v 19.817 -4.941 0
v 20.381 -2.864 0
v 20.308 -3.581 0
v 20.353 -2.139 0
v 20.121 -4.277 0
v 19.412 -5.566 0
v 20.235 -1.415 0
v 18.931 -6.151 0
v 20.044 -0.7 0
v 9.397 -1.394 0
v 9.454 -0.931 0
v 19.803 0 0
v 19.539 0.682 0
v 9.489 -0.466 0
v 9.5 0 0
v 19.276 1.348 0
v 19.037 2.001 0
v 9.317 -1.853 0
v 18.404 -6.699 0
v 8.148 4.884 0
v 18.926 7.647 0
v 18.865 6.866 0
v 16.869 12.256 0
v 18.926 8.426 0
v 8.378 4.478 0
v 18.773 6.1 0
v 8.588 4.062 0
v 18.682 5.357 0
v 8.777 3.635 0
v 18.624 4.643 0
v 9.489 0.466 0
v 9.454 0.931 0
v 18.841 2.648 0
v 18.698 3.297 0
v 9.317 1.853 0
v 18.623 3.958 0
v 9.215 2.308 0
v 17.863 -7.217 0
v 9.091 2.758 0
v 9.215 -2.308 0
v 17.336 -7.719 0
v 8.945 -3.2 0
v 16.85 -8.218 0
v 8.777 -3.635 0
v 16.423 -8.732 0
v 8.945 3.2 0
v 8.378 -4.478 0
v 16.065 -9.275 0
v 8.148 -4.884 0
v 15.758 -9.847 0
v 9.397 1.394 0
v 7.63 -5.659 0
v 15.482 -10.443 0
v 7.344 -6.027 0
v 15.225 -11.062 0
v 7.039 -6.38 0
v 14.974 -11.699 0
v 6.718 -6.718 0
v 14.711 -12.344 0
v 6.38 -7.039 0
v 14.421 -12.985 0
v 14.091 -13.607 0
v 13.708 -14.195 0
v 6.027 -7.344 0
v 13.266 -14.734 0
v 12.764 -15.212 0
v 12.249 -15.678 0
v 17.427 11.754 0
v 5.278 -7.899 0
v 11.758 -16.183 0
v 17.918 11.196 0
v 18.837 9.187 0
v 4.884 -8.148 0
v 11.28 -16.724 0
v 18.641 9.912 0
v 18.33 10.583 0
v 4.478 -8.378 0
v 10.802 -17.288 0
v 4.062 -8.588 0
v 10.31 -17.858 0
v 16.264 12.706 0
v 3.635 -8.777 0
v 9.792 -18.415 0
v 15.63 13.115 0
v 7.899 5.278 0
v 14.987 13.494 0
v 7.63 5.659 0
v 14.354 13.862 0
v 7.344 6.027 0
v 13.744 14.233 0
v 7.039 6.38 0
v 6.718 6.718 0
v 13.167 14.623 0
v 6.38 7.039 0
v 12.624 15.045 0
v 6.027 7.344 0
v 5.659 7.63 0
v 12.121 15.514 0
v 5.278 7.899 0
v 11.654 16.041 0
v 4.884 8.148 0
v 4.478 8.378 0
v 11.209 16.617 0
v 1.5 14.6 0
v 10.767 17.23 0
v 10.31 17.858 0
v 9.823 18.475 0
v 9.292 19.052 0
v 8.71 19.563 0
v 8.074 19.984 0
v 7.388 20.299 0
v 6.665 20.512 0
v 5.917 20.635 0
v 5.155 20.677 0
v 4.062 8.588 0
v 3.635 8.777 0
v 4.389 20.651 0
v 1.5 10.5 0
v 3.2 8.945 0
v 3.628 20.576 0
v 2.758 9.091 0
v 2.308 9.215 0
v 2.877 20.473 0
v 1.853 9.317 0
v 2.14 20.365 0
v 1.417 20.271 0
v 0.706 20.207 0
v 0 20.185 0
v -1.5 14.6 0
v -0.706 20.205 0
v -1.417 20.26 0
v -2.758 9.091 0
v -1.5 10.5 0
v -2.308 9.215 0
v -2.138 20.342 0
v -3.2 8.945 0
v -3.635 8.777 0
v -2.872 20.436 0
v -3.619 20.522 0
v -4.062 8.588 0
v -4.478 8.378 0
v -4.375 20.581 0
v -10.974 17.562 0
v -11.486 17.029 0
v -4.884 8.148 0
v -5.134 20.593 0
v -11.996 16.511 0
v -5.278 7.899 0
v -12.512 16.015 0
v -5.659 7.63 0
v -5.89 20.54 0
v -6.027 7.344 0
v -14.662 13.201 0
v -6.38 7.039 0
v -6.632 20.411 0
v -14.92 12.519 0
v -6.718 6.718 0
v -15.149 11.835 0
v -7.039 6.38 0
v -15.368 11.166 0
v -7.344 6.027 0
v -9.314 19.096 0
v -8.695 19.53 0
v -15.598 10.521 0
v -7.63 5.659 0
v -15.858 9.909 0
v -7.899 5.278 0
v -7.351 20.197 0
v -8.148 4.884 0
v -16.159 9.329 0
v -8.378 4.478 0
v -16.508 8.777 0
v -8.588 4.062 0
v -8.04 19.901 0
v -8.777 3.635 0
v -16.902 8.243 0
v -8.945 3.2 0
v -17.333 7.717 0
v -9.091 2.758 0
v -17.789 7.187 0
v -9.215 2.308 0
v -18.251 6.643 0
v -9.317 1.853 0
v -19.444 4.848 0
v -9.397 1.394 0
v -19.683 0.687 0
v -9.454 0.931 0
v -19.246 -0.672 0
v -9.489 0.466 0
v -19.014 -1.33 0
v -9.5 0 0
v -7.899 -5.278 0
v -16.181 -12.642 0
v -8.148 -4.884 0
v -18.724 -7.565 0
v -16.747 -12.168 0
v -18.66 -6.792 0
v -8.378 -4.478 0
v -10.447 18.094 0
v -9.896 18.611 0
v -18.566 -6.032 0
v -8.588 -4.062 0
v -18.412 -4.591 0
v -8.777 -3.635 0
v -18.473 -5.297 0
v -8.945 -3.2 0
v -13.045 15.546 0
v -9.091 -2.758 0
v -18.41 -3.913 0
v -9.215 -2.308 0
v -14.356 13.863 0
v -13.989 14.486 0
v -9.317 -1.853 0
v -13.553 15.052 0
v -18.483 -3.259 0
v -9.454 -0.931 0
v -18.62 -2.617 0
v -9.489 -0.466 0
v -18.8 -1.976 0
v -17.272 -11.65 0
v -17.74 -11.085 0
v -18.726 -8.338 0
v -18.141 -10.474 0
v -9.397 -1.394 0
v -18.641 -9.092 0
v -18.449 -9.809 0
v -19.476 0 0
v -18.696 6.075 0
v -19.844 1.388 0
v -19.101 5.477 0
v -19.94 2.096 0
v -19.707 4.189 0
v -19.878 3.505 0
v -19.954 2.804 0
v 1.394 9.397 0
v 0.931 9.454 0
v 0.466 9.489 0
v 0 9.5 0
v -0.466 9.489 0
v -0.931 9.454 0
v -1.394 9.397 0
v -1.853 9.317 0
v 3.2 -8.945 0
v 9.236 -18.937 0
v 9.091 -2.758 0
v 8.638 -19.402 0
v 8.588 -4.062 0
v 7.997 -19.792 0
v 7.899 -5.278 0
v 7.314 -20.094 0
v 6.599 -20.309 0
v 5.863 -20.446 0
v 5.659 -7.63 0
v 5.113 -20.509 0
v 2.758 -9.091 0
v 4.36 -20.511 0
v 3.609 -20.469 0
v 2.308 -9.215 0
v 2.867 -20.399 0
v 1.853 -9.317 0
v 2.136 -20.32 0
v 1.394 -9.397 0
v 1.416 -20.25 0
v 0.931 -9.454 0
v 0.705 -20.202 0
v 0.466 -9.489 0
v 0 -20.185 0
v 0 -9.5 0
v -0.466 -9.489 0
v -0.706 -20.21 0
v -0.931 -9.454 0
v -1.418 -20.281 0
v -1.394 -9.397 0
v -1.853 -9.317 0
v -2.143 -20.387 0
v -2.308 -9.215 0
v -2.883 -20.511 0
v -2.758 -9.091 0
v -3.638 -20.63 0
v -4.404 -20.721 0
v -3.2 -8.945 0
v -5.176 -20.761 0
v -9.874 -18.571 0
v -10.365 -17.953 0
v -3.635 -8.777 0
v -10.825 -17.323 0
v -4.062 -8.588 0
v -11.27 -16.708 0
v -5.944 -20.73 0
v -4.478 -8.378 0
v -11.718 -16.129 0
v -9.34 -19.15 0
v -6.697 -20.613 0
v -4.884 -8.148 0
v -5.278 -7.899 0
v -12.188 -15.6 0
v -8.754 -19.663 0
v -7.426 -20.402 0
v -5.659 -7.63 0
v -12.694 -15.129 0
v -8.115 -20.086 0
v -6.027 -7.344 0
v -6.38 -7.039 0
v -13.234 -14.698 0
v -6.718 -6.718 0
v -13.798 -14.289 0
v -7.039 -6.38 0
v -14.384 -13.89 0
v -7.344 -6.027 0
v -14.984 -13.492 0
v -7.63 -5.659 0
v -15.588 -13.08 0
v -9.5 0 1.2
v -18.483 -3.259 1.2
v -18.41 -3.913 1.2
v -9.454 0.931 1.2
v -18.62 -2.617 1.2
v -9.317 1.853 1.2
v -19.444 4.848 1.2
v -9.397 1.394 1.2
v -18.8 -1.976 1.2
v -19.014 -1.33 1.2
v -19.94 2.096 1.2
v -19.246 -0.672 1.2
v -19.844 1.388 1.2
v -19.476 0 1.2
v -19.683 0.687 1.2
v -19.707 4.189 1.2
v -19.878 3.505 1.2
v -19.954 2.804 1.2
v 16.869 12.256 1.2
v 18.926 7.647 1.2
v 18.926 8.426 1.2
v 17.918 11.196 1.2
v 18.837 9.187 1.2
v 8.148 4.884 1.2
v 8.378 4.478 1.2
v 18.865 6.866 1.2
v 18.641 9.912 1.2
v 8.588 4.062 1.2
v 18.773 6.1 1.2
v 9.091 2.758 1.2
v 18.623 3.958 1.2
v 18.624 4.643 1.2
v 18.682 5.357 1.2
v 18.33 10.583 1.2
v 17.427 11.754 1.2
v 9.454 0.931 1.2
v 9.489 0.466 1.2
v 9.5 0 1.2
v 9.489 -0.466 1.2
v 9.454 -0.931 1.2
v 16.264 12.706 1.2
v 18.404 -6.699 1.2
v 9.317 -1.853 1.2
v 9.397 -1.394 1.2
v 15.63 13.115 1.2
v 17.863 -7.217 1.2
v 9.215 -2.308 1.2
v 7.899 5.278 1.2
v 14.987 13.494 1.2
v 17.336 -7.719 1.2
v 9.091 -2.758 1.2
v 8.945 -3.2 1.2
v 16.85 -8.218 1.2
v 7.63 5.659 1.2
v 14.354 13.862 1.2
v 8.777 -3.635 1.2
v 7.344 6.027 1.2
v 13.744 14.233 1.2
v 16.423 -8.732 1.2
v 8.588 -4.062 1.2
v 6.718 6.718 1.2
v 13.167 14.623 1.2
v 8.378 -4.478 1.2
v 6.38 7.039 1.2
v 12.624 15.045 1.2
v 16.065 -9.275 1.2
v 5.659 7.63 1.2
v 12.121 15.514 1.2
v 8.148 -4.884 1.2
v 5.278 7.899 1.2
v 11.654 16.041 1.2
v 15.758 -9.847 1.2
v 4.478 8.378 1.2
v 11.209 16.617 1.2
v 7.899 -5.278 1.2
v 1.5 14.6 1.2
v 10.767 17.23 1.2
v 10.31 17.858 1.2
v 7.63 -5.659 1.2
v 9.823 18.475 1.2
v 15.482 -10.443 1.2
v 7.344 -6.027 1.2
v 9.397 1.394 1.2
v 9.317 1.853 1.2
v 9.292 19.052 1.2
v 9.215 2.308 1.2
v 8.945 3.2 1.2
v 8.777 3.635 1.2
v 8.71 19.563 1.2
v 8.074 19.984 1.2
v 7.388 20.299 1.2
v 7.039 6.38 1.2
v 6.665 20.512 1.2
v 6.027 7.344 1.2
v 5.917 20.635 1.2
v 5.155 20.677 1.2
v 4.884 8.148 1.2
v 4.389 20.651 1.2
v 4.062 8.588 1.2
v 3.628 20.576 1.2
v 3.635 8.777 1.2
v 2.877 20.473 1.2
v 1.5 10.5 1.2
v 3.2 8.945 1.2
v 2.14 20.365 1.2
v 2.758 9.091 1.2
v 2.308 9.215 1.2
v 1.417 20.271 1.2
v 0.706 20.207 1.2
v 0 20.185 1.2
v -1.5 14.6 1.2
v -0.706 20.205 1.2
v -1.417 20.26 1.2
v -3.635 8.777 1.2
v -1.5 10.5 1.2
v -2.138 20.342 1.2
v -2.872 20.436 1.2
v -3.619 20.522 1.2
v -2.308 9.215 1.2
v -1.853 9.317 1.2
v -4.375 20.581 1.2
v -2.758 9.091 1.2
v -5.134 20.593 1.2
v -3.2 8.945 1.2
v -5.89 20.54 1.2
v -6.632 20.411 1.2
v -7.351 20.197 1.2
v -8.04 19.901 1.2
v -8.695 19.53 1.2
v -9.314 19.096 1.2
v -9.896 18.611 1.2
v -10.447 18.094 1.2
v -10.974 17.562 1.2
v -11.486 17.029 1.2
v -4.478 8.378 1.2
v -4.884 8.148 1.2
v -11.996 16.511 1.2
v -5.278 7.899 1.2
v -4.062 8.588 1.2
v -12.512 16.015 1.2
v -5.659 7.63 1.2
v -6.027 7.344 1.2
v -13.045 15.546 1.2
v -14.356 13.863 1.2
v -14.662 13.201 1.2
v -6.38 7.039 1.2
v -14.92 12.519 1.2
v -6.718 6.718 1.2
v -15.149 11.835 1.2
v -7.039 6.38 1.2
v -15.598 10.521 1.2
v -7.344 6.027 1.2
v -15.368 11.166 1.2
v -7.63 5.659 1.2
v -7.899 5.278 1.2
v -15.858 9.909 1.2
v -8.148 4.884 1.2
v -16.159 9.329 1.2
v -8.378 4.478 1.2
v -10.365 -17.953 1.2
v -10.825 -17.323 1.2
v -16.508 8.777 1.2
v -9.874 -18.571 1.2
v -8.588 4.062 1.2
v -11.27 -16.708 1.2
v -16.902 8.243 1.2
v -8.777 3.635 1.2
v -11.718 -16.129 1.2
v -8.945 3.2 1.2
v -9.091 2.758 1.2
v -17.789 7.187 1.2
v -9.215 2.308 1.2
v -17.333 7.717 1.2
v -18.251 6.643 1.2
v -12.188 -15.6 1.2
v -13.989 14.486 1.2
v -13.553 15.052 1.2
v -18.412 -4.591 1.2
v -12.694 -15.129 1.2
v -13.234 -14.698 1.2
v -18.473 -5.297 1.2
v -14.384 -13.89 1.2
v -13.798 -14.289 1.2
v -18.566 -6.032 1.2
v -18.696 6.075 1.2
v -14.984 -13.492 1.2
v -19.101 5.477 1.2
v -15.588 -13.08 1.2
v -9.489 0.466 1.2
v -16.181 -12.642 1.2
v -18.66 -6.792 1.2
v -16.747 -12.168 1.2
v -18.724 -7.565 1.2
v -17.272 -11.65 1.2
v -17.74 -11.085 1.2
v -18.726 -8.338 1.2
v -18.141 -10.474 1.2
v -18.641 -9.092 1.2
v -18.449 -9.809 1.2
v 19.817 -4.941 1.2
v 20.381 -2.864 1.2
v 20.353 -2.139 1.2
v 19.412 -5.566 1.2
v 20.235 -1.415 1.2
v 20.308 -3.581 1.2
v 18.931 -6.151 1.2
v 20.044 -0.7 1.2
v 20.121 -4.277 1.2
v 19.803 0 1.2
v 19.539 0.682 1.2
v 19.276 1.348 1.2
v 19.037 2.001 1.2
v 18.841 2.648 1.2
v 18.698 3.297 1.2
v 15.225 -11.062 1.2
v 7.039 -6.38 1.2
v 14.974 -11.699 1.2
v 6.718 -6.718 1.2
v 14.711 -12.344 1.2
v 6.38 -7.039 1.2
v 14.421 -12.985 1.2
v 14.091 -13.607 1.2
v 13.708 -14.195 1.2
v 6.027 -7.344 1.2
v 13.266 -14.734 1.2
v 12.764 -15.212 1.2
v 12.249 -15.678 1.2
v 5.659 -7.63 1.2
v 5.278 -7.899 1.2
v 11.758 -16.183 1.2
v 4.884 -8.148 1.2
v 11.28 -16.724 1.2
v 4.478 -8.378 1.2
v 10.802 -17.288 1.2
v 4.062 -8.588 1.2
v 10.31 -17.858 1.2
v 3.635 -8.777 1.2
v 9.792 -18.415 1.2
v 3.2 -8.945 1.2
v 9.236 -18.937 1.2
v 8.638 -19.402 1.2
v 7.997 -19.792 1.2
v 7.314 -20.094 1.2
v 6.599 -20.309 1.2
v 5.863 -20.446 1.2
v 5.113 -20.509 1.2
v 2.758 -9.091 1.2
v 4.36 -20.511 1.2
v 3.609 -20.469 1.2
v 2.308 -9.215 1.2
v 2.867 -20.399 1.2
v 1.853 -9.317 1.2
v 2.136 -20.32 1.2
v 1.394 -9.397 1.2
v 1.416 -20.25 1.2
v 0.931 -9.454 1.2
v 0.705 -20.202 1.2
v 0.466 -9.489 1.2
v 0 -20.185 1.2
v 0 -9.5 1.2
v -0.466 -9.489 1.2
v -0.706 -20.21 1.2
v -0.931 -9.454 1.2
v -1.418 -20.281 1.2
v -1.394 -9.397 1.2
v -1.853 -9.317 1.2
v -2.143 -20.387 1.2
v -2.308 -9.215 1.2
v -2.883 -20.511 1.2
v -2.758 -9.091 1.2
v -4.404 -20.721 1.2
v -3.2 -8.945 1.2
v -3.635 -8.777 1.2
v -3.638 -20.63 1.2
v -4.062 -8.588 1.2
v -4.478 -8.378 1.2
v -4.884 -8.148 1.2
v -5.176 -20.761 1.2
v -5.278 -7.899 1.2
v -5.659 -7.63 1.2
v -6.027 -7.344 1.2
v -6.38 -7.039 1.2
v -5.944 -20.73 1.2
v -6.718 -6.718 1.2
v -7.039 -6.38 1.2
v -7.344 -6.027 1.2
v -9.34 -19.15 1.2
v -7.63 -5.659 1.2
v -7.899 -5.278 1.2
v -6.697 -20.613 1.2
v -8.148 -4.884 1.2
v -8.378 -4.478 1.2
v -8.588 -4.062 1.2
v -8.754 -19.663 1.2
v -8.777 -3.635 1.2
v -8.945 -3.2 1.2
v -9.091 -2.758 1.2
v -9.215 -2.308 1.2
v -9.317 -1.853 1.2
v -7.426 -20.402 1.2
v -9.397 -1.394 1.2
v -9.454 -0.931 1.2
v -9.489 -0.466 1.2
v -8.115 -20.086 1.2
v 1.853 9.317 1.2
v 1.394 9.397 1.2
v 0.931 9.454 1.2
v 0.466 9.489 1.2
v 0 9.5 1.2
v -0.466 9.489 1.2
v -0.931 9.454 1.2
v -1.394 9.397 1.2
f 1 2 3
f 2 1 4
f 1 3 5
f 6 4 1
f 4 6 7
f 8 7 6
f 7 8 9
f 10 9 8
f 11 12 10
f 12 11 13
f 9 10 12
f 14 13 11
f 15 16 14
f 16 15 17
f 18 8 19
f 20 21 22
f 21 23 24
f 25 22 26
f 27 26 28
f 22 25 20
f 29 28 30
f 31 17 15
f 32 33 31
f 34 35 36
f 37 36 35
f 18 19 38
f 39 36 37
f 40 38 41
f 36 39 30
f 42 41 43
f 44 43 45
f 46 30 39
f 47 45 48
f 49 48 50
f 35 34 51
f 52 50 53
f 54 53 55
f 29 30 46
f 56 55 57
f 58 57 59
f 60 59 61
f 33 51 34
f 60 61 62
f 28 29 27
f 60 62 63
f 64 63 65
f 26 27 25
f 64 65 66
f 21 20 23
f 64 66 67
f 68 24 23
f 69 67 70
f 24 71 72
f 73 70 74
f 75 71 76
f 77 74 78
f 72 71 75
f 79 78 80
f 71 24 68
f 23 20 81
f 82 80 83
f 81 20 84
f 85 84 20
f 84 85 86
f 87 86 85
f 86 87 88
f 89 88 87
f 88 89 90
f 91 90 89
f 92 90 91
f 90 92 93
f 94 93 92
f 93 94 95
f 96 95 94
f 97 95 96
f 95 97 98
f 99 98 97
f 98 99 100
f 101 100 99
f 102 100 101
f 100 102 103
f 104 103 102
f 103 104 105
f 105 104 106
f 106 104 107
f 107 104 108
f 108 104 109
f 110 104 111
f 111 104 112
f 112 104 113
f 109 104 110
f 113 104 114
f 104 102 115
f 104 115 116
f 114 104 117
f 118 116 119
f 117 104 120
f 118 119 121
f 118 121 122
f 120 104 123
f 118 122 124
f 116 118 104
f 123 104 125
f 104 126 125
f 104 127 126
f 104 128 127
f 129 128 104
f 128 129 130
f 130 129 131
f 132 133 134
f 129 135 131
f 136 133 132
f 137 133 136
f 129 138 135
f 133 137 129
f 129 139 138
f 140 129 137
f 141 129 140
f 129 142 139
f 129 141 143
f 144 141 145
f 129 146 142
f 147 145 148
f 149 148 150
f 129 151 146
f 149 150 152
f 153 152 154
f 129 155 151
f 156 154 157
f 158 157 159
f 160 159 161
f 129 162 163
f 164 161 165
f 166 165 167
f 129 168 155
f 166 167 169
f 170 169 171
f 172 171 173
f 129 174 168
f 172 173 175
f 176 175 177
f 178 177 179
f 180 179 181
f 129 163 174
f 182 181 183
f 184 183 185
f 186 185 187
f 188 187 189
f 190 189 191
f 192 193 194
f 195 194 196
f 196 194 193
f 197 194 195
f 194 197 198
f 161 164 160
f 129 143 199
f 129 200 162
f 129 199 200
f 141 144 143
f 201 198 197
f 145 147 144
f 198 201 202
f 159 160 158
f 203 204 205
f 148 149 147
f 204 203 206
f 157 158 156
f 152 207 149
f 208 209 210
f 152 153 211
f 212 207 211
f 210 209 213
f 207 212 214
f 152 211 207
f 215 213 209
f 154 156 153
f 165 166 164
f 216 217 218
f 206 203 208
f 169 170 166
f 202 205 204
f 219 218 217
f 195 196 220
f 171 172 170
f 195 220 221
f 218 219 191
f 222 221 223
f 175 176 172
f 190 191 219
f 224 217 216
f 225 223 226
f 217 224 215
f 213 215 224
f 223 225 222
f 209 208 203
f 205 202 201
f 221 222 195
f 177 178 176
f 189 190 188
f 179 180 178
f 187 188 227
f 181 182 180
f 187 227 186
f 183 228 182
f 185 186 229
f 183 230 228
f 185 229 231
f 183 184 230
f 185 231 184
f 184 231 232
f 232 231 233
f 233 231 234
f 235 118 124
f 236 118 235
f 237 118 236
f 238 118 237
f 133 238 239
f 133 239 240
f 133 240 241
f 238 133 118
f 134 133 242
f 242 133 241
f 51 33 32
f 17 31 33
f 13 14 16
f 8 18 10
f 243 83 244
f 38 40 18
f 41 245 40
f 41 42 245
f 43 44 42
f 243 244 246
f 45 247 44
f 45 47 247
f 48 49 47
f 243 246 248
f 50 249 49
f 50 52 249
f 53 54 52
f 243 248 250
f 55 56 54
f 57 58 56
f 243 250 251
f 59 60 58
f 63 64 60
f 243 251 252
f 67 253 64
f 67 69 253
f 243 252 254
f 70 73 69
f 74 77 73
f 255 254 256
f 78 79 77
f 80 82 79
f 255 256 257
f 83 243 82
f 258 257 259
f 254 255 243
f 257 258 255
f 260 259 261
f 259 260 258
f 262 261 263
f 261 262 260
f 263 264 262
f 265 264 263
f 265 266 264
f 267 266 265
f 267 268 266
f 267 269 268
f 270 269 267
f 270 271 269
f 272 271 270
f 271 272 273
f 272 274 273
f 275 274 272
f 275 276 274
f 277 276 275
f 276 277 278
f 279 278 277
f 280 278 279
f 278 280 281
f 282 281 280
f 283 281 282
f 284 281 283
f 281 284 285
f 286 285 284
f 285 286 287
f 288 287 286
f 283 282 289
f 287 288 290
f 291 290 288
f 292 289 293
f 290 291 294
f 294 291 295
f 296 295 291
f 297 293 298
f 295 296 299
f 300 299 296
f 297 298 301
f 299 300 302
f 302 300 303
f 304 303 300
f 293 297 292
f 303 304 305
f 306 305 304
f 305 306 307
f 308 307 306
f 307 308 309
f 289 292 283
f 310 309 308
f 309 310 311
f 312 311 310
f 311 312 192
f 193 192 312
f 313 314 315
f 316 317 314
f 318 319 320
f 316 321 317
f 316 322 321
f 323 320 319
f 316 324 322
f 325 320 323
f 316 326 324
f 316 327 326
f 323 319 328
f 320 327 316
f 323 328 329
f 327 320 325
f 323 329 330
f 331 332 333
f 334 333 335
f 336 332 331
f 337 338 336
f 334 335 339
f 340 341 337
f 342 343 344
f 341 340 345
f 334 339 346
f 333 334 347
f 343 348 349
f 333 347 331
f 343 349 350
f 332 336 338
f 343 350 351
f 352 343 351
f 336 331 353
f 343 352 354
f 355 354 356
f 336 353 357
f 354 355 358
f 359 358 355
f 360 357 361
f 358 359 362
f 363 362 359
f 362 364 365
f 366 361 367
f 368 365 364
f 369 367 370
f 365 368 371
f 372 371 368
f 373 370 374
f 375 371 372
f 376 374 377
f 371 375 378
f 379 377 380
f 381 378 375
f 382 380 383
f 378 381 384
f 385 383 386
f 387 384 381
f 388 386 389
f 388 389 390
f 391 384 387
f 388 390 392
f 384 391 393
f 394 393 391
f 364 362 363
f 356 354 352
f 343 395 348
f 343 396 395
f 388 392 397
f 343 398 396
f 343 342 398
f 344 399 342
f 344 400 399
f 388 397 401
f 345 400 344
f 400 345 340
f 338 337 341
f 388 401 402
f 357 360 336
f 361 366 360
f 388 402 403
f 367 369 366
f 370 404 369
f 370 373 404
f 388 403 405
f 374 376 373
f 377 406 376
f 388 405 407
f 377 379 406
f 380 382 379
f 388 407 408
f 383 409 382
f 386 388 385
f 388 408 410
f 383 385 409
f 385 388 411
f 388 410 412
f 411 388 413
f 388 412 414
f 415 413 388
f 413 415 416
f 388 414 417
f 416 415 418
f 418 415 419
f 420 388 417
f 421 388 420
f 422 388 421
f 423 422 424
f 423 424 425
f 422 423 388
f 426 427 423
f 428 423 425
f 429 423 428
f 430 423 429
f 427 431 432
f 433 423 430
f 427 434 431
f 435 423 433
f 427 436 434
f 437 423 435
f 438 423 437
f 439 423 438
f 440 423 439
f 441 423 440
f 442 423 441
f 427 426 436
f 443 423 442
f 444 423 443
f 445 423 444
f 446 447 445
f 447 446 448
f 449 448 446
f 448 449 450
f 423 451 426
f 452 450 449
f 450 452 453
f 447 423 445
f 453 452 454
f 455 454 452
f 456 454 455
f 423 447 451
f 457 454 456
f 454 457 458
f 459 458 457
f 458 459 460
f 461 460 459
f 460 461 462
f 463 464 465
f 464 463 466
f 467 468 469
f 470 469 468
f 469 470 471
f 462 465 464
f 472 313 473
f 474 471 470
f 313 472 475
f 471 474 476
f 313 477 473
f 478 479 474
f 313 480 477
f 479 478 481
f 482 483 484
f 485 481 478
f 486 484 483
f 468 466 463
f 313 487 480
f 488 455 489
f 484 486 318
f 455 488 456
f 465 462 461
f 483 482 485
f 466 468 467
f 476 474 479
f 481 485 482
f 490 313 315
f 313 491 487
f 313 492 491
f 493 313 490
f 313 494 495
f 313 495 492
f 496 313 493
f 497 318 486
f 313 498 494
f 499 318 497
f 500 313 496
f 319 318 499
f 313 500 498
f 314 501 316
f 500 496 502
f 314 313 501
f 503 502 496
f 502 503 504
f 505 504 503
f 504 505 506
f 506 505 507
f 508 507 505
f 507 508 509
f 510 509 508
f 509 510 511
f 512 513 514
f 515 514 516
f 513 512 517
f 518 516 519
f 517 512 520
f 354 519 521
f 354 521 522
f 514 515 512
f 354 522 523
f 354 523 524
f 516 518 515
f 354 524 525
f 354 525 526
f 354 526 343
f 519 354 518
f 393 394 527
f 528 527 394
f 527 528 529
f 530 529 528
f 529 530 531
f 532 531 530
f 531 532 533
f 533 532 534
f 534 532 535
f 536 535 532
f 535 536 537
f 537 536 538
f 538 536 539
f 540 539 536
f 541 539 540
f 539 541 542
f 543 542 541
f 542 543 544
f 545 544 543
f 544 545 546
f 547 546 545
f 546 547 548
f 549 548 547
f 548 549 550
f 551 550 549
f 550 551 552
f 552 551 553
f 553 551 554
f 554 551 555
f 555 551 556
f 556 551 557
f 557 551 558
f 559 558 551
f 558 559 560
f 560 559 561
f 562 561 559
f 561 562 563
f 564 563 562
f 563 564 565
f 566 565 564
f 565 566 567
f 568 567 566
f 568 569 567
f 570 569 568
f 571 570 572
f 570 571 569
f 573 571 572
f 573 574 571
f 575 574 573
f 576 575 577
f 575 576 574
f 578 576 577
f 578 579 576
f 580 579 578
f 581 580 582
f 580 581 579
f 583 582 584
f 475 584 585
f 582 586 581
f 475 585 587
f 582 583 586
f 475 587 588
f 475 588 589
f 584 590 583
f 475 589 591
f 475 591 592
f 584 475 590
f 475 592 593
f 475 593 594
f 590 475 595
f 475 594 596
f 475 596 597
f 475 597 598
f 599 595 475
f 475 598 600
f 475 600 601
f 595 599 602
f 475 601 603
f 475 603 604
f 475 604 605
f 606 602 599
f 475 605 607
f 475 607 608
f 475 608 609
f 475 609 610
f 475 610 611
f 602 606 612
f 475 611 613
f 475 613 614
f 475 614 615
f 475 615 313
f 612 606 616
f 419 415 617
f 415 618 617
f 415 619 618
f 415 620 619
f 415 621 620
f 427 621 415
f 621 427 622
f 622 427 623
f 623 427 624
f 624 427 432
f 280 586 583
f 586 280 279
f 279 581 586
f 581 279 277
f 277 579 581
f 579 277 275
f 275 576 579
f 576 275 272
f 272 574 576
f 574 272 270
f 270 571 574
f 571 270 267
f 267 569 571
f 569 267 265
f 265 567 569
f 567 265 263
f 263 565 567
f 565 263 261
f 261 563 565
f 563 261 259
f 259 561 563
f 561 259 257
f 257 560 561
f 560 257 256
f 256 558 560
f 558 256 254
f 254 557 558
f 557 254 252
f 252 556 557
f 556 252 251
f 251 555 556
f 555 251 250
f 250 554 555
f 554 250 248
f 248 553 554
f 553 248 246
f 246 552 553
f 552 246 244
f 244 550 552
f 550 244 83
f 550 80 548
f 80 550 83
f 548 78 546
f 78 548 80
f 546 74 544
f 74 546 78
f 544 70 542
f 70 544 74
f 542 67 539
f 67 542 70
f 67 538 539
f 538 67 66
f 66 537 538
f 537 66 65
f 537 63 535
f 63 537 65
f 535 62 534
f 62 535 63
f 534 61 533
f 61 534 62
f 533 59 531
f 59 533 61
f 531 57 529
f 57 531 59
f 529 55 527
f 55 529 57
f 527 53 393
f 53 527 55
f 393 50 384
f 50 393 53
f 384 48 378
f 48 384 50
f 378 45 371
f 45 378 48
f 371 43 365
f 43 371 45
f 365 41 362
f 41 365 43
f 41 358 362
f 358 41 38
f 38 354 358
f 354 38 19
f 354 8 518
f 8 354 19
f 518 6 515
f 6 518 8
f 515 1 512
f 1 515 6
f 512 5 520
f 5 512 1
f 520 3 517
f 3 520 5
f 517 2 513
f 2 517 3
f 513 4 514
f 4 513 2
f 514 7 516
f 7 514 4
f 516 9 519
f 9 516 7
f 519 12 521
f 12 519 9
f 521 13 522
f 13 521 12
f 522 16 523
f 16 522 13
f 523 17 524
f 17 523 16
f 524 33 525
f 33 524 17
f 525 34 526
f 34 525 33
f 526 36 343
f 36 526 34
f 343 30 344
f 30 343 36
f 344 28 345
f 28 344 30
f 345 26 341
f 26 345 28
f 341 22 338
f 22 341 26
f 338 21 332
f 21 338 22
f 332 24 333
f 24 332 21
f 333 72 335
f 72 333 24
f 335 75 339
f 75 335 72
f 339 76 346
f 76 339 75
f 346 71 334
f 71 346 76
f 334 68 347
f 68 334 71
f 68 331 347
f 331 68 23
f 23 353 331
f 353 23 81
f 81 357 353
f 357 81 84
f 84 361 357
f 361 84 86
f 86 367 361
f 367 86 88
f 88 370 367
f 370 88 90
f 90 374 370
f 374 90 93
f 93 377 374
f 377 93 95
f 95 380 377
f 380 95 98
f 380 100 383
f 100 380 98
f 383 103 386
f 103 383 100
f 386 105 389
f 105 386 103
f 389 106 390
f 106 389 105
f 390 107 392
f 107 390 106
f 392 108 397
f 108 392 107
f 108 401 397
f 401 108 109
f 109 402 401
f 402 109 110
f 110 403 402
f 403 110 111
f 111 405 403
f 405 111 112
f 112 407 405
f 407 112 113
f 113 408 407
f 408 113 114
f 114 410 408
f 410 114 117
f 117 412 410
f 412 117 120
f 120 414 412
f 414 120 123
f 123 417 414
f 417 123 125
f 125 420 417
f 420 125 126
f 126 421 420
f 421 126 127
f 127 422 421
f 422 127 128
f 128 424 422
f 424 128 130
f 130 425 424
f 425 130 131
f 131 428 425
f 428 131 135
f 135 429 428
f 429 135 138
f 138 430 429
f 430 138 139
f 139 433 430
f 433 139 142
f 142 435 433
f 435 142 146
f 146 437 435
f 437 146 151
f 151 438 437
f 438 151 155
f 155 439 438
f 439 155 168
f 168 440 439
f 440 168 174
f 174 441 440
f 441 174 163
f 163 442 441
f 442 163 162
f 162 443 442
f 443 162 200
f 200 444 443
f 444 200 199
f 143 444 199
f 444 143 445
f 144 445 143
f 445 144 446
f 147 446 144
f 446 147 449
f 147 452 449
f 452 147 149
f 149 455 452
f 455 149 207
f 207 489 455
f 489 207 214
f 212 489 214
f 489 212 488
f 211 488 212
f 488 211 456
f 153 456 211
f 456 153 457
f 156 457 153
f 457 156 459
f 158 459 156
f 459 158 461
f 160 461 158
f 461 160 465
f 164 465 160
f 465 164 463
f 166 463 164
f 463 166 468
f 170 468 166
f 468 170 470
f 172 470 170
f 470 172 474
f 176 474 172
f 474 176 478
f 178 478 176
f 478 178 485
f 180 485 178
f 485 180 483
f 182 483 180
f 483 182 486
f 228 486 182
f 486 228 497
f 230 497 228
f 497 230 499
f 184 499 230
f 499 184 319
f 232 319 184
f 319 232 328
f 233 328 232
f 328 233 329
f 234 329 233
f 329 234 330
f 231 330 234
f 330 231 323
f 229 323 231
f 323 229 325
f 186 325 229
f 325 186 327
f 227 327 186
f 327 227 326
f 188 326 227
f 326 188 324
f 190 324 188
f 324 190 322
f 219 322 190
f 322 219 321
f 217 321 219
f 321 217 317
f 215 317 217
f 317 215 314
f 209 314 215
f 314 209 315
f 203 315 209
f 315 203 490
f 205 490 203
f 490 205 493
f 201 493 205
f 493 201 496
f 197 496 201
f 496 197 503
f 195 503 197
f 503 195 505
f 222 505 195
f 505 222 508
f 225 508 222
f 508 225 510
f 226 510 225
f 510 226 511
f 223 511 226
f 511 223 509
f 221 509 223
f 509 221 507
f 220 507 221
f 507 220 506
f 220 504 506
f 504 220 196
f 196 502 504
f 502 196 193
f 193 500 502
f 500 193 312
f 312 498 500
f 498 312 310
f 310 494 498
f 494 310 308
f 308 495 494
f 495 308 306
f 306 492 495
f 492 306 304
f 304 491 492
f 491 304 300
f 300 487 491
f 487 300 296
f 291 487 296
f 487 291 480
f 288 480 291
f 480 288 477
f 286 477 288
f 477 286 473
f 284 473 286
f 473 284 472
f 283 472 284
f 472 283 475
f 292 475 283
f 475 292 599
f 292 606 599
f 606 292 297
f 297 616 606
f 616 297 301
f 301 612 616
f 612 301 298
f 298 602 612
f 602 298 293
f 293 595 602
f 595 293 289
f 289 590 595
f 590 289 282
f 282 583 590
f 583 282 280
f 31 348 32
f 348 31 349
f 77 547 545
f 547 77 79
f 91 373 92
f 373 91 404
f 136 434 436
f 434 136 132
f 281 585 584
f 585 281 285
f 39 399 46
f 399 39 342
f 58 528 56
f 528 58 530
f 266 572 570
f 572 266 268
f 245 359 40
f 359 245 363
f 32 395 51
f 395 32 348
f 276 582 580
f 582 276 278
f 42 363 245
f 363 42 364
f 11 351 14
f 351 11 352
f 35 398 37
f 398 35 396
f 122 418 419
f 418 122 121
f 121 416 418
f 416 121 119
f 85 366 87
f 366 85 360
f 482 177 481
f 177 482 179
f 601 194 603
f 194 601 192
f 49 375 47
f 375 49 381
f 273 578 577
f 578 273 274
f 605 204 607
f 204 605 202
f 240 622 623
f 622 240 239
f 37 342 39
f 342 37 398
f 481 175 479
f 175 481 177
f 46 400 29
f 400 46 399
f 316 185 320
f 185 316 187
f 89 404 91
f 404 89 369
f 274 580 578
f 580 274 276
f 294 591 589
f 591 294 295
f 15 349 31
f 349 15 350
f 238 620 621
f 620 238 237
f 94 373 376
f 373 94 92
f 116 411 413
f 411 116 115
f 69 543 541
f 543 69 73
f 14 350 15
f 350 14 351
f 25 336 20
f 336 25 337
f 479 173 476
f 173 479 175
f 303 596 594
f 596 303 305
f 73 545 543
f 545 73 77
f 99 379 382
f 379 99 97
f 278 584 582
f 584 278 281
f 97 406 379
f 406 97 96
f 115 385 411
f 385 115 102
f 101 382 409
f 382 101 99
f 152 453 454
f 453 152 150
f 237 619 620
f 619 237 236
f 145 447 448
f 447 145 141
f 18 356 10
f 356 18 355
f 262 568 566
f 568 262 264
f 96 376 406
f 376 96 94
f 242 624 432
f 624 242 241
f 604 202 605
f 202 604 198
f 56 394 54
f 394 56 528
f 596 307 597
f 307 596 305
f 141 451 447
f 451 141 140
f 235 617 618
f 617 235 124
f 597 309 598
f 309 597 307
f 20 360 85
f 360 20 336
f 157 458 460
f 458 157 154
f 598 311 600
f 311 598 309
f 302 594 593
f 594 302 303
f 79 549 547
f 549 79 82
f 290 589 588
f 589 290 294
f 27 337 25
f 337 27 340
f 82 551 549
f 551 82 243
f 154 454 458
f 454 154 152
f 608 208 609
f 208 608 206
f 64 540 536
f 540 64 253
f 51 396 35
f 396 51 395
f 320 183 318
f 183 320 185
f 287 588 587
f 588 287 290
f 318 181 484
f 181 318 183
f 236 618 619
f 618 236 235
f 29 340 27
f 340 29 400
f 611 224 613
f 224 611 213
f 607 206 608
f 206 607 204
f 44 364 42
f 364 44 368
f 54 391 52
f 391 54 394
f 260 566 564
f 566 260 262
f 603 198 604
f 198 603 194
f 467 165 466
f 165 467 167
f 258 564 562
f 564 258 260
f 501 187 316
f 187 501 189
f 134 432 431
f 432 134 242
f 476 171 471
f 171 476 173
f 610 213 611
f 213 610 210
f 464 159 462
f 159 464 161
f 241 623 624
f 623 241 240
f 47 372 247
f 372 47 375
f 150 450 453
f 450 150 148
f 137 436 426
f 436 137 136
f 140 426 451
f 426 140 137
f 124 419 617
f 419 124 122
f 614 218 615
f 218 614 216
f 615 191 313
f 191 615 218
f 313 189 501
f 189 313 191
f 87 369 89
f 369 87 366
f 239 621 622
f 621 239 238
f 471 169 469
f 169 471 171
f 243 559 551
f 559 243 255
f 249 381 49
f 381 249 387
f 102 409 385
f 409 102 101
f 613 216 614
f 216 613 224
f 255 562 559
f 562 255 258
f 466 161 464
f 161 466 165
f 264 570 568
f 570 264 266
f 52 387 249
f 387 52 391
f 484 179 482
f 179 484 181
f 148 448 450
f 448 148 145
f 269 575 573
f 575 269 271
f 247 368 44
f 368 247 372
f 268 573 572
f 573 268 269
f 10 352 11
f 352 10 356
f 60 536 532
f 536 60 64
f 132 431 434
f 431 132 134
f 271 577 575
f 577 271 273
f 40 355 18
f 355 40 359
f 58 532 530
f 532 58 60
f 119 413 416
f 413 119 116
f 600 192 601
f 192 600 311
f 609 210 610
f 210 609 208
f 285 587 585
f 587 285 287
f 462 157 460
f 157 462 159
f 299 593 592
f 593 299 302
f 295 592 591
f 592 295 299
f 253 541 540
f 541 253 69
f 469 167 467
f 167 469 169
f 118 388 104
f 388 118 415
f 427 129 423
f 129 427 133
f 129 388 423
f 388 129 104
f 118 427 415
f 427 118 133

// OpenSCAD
/*
  Elna Supermatic cam 30
  Name: Uneven wave
  Status: candidate

  Generated from measured parametric base v2.
  Surface mode: smooth
*/

include <_elna_measured_common.scad>;

profile_points = [
        [0.0000, 20.1850],
        [0.7057, 20.2074],
        [1.4175, 20.2708],
        [2.1404, 20.3649],
        [2.8773, 20.4734],
        [3.6281, 20.5761],
        [4.3895, 20.6511],
        [5.1553, 20.6769],
        [5.9170, 20.6351],
        [6.6647, 20.5117],
        [7.3883, 20.2992],
        [8.0743, 19.9845],
        [8.7101, 19.5633],
        [9.2924, 19.0523],
        [9.8233, 18.4749],
        [10.3105, 17.8583],
        [10.7668, 17.2305],
        [11.2087, 16.6175],
        [11.6542, 16.0407],
        [12.1212, 15.5144],
        [12.6243, 15.0451],
        [13.1667, 14.6231],
        [13.7443, 14.2327],
        [14.3541, 13.8616],
        [14.9872, 13.4945],
        [15.6296, 13.1148],
        [16.2636, 12.7065],
        [16.8692, 12.2562],
        [17.4266, 11.7544],
        [17.9181, 11.1965],
        [18.3303, 10.5830],
        [18.6414, 9.9118],
        [18.8368, 9.1873],
        [18.9256, 8.4262],
        [18.9264, 7.6468],
        [18.8653, 6.8664],
        [18.7731, 6.0997],
        [18.6824, 5.3571],
        [18.6240, 4.6435],
        [18.6233, 3.9585],
        [18.6976, 3.2969],
        [18.8409, 2.6479],
        [19.0373, 2.0009],
        [19.2759, 1.3479],
        [19.5390, 0.6823],
        [19.8035, 0.0000],
        [20.0439, -0.6999],
        [20.2346, -1.4149],
        [20.3528, -2.1392],
        [20.3807, -2.8643],
        [20.3077, -3.5808],
        [20.1208, -4.2768],
        [19.8166, -4.9408],
        [19.4119, -5.5663],
        [18.9312, -6.1511],
        [18.4043, -6.6986],
        [17.8627, -7.2170],
        [17.3362, -7.7186],
        [16.8504, -8.2185],
        [16.4234, -8.7325],
        [16.0648, -9.2750],
        [15.7584, -9.8470],
        [15.4822, -10.4429],
        [15.2254, -11.0619],
        [14.9737, -11.6987],
        [14.7111, -12.3441],
        [14.4215, -12.9852],
        [14.0907, -13.6073],
        [13.7078, -14.1948],
        [13.2662, -14.7336],
        [12.7645, -15.2121],
        [12.2488, -15.6777],
        [11.7579, -16.1833],
        [11.2803, -16.7238],
        [10.8025, -17.2876],
        [10.3105, -17.8583],
        [9.7917, -18.4154],
        [9.2363, -18.9371],
        [8.6384, -19.4021],
        [7.9966, -19.7923],
        [7.3138, -20.0944],
        [6.5990, -20.3095],
        [5.8627, -20.4456],
        [5.1135, -20.5090],
        [4.3599, -20.5115],
        [3.6092, -20.4687],
        [2.8669, -20.3988],
        [2.1357, -20.3202],
        [1.4160, -20.2500],
        [0.7055, -20.2020],
        [0.0000, -20.1850],
        [-0.7057, -20.2100],
        [-1.4182, -20.2812],
        [-2.1428, -20.3872],
        [-2.8826, -20.5107],
        [-3.6376, -20.6298],
        [-4.4044, -20.7209],
        [-5.1763, -20.7609],
        [-5.9442, -20.7299],
        [-6.6975, -20.6129],
        [-7.4256, -20.4017],
        [-8.1151, -20.0856],
        [-8.7545, -19.6628],
        [-9.3402, -19.1503],
        [-9.8745, -18.5712],
        [-10.3650, -17.9527],
        [-10.8246, -17.3230],
        [-11.2696, -16.7079],
        [-11.7183, -16.1288],
        [-12.1883, -15.6003],
        [-12.6944, -15.1286],
        [-13.2343, -14.6982],
        [-13.7983, -14.2886],
        [-14.3840, -13.8905],
        [-14.9842, -13.4918],
        [-15.5879, -13.0798],
        [-16.1808, -12.6418],
        [-16.7474, -12.1677],
        [-17.2718, -11.6499],
        [-17.7400, -11.0852],
        [-18.1415, -10.4740],
        [-18.4489, -9.8094],
        [-18.6408, -9.0917],
        [-18.7265, -8.3376],
        [-18.7243, -7.5651],
        [-18.6604, -6.7918],
        [-18.5657, -6.0324],
        [-18.4729, -5.2970],
        [-18.4125, -4.5908],
        [-18.4101, -3.9132],
        [-18.4829, -3.2590],
        [-18.6197, -2.6168],
        [-18.7998, -1.9759],
        [-19.0136, -1.3296],
        [-19.2458, -0.6721],
        [-19.4765, -0.0000],
        [-19.6834, 0.6874],
        [-19.8445, 1.3877],
        [-19.9399, 2.0958],
        [-19.9542, 2.8044],
        [-19.8783, 3.5051],
        [-19.7074, 4.1889],
        [-19.4440, 4.8479],
        [-19.1007, 5.4770],
        [-18.6957, 6.0746],
        [-18.2507, 6.6427],
        [-17.7892, 7.1873],
        [-17.3332, 7.7172],
        [-16.9016, 8.2434],
        [-16.5079, 8.7774],
        [-16.1592, 9.3295],
        [-15.8577, 9.9090],
        [-15.5984, 10.5213],
        [-15.3681, 11.1656],
        [-15.1486, 11.8354],
        [-14.9199, 12.5193],
        [-14.6616, 13.2014],
        [-14.3559, 13.8633],
        [-13.9889, 14.4860],
        [-13.5526, 15.0516],
        [-13.0447, 15.5461],
        [-12.5123, 16.0150],
        [-11.9958, 16.5108],
        [-11.4865, 17.0294],
        [-10.9737, 17.5616],
        [-10.4468, 18.0943],
        [-9.8959, 18.6114],
        [-9.3136, 19.0957],
        [-8.6954, 19.5302],
        [-8.0404, 19.9008],
        [-7.3510, 20.1968],
        [-6.6318, 20.4106],
        [-5.8898, 20.5403],
        [-5.1344, 20.5930],
        [-4.3747, 20.5813],
        [-3.6187, 20.5224],
        [-2.8721, 20.4361],
        [-2.1381, 20.3425],
        [-1.4167, 20.2604],
        [-0.7056, 20.2047]
];

icon_points = [[-1.000,0.500], [-0.956,0.599], [-0.911,0.691], [-0.867,0.768], [-0.822,0.824], [-0.778,0.855], [-0.733,0.858], [-0.689,0.834], [-0.644,0.784], [-0.600,0.712], [-0.556,0.623], [-0.511,0.525], [-0.467,0.425], [-0.422,0.331], [-0.378,0.250], [-0.333,0.188], [-0.289,0.151], [-0.244,0.140], [-0.200,0.158], [-0.156,0.202], [-0.111,0.269], [-0.067,0.354], [-0.022,0.450], [0.022,0.550], [0.067,0.646], [0.111,0.731], [0.156,0.798], [0.200,0.842], [0.244,0.860], [0.289,0.849], [0.333,0.812], [0.378,0.750], [0.422,0.669], [0.467,0.575], [0.511,0.475], [0.556,0.377], [0.600,0.288], [0.644,0.216], [0.689,0.166], [0.733,0.142], [0.778,0.145], [0.822,0.176], [0.867,0.232], [0.911,0.309], [0.956,0.401], [1.000,0.500]];

elna_cam_ring(profile_points=profile_points);
